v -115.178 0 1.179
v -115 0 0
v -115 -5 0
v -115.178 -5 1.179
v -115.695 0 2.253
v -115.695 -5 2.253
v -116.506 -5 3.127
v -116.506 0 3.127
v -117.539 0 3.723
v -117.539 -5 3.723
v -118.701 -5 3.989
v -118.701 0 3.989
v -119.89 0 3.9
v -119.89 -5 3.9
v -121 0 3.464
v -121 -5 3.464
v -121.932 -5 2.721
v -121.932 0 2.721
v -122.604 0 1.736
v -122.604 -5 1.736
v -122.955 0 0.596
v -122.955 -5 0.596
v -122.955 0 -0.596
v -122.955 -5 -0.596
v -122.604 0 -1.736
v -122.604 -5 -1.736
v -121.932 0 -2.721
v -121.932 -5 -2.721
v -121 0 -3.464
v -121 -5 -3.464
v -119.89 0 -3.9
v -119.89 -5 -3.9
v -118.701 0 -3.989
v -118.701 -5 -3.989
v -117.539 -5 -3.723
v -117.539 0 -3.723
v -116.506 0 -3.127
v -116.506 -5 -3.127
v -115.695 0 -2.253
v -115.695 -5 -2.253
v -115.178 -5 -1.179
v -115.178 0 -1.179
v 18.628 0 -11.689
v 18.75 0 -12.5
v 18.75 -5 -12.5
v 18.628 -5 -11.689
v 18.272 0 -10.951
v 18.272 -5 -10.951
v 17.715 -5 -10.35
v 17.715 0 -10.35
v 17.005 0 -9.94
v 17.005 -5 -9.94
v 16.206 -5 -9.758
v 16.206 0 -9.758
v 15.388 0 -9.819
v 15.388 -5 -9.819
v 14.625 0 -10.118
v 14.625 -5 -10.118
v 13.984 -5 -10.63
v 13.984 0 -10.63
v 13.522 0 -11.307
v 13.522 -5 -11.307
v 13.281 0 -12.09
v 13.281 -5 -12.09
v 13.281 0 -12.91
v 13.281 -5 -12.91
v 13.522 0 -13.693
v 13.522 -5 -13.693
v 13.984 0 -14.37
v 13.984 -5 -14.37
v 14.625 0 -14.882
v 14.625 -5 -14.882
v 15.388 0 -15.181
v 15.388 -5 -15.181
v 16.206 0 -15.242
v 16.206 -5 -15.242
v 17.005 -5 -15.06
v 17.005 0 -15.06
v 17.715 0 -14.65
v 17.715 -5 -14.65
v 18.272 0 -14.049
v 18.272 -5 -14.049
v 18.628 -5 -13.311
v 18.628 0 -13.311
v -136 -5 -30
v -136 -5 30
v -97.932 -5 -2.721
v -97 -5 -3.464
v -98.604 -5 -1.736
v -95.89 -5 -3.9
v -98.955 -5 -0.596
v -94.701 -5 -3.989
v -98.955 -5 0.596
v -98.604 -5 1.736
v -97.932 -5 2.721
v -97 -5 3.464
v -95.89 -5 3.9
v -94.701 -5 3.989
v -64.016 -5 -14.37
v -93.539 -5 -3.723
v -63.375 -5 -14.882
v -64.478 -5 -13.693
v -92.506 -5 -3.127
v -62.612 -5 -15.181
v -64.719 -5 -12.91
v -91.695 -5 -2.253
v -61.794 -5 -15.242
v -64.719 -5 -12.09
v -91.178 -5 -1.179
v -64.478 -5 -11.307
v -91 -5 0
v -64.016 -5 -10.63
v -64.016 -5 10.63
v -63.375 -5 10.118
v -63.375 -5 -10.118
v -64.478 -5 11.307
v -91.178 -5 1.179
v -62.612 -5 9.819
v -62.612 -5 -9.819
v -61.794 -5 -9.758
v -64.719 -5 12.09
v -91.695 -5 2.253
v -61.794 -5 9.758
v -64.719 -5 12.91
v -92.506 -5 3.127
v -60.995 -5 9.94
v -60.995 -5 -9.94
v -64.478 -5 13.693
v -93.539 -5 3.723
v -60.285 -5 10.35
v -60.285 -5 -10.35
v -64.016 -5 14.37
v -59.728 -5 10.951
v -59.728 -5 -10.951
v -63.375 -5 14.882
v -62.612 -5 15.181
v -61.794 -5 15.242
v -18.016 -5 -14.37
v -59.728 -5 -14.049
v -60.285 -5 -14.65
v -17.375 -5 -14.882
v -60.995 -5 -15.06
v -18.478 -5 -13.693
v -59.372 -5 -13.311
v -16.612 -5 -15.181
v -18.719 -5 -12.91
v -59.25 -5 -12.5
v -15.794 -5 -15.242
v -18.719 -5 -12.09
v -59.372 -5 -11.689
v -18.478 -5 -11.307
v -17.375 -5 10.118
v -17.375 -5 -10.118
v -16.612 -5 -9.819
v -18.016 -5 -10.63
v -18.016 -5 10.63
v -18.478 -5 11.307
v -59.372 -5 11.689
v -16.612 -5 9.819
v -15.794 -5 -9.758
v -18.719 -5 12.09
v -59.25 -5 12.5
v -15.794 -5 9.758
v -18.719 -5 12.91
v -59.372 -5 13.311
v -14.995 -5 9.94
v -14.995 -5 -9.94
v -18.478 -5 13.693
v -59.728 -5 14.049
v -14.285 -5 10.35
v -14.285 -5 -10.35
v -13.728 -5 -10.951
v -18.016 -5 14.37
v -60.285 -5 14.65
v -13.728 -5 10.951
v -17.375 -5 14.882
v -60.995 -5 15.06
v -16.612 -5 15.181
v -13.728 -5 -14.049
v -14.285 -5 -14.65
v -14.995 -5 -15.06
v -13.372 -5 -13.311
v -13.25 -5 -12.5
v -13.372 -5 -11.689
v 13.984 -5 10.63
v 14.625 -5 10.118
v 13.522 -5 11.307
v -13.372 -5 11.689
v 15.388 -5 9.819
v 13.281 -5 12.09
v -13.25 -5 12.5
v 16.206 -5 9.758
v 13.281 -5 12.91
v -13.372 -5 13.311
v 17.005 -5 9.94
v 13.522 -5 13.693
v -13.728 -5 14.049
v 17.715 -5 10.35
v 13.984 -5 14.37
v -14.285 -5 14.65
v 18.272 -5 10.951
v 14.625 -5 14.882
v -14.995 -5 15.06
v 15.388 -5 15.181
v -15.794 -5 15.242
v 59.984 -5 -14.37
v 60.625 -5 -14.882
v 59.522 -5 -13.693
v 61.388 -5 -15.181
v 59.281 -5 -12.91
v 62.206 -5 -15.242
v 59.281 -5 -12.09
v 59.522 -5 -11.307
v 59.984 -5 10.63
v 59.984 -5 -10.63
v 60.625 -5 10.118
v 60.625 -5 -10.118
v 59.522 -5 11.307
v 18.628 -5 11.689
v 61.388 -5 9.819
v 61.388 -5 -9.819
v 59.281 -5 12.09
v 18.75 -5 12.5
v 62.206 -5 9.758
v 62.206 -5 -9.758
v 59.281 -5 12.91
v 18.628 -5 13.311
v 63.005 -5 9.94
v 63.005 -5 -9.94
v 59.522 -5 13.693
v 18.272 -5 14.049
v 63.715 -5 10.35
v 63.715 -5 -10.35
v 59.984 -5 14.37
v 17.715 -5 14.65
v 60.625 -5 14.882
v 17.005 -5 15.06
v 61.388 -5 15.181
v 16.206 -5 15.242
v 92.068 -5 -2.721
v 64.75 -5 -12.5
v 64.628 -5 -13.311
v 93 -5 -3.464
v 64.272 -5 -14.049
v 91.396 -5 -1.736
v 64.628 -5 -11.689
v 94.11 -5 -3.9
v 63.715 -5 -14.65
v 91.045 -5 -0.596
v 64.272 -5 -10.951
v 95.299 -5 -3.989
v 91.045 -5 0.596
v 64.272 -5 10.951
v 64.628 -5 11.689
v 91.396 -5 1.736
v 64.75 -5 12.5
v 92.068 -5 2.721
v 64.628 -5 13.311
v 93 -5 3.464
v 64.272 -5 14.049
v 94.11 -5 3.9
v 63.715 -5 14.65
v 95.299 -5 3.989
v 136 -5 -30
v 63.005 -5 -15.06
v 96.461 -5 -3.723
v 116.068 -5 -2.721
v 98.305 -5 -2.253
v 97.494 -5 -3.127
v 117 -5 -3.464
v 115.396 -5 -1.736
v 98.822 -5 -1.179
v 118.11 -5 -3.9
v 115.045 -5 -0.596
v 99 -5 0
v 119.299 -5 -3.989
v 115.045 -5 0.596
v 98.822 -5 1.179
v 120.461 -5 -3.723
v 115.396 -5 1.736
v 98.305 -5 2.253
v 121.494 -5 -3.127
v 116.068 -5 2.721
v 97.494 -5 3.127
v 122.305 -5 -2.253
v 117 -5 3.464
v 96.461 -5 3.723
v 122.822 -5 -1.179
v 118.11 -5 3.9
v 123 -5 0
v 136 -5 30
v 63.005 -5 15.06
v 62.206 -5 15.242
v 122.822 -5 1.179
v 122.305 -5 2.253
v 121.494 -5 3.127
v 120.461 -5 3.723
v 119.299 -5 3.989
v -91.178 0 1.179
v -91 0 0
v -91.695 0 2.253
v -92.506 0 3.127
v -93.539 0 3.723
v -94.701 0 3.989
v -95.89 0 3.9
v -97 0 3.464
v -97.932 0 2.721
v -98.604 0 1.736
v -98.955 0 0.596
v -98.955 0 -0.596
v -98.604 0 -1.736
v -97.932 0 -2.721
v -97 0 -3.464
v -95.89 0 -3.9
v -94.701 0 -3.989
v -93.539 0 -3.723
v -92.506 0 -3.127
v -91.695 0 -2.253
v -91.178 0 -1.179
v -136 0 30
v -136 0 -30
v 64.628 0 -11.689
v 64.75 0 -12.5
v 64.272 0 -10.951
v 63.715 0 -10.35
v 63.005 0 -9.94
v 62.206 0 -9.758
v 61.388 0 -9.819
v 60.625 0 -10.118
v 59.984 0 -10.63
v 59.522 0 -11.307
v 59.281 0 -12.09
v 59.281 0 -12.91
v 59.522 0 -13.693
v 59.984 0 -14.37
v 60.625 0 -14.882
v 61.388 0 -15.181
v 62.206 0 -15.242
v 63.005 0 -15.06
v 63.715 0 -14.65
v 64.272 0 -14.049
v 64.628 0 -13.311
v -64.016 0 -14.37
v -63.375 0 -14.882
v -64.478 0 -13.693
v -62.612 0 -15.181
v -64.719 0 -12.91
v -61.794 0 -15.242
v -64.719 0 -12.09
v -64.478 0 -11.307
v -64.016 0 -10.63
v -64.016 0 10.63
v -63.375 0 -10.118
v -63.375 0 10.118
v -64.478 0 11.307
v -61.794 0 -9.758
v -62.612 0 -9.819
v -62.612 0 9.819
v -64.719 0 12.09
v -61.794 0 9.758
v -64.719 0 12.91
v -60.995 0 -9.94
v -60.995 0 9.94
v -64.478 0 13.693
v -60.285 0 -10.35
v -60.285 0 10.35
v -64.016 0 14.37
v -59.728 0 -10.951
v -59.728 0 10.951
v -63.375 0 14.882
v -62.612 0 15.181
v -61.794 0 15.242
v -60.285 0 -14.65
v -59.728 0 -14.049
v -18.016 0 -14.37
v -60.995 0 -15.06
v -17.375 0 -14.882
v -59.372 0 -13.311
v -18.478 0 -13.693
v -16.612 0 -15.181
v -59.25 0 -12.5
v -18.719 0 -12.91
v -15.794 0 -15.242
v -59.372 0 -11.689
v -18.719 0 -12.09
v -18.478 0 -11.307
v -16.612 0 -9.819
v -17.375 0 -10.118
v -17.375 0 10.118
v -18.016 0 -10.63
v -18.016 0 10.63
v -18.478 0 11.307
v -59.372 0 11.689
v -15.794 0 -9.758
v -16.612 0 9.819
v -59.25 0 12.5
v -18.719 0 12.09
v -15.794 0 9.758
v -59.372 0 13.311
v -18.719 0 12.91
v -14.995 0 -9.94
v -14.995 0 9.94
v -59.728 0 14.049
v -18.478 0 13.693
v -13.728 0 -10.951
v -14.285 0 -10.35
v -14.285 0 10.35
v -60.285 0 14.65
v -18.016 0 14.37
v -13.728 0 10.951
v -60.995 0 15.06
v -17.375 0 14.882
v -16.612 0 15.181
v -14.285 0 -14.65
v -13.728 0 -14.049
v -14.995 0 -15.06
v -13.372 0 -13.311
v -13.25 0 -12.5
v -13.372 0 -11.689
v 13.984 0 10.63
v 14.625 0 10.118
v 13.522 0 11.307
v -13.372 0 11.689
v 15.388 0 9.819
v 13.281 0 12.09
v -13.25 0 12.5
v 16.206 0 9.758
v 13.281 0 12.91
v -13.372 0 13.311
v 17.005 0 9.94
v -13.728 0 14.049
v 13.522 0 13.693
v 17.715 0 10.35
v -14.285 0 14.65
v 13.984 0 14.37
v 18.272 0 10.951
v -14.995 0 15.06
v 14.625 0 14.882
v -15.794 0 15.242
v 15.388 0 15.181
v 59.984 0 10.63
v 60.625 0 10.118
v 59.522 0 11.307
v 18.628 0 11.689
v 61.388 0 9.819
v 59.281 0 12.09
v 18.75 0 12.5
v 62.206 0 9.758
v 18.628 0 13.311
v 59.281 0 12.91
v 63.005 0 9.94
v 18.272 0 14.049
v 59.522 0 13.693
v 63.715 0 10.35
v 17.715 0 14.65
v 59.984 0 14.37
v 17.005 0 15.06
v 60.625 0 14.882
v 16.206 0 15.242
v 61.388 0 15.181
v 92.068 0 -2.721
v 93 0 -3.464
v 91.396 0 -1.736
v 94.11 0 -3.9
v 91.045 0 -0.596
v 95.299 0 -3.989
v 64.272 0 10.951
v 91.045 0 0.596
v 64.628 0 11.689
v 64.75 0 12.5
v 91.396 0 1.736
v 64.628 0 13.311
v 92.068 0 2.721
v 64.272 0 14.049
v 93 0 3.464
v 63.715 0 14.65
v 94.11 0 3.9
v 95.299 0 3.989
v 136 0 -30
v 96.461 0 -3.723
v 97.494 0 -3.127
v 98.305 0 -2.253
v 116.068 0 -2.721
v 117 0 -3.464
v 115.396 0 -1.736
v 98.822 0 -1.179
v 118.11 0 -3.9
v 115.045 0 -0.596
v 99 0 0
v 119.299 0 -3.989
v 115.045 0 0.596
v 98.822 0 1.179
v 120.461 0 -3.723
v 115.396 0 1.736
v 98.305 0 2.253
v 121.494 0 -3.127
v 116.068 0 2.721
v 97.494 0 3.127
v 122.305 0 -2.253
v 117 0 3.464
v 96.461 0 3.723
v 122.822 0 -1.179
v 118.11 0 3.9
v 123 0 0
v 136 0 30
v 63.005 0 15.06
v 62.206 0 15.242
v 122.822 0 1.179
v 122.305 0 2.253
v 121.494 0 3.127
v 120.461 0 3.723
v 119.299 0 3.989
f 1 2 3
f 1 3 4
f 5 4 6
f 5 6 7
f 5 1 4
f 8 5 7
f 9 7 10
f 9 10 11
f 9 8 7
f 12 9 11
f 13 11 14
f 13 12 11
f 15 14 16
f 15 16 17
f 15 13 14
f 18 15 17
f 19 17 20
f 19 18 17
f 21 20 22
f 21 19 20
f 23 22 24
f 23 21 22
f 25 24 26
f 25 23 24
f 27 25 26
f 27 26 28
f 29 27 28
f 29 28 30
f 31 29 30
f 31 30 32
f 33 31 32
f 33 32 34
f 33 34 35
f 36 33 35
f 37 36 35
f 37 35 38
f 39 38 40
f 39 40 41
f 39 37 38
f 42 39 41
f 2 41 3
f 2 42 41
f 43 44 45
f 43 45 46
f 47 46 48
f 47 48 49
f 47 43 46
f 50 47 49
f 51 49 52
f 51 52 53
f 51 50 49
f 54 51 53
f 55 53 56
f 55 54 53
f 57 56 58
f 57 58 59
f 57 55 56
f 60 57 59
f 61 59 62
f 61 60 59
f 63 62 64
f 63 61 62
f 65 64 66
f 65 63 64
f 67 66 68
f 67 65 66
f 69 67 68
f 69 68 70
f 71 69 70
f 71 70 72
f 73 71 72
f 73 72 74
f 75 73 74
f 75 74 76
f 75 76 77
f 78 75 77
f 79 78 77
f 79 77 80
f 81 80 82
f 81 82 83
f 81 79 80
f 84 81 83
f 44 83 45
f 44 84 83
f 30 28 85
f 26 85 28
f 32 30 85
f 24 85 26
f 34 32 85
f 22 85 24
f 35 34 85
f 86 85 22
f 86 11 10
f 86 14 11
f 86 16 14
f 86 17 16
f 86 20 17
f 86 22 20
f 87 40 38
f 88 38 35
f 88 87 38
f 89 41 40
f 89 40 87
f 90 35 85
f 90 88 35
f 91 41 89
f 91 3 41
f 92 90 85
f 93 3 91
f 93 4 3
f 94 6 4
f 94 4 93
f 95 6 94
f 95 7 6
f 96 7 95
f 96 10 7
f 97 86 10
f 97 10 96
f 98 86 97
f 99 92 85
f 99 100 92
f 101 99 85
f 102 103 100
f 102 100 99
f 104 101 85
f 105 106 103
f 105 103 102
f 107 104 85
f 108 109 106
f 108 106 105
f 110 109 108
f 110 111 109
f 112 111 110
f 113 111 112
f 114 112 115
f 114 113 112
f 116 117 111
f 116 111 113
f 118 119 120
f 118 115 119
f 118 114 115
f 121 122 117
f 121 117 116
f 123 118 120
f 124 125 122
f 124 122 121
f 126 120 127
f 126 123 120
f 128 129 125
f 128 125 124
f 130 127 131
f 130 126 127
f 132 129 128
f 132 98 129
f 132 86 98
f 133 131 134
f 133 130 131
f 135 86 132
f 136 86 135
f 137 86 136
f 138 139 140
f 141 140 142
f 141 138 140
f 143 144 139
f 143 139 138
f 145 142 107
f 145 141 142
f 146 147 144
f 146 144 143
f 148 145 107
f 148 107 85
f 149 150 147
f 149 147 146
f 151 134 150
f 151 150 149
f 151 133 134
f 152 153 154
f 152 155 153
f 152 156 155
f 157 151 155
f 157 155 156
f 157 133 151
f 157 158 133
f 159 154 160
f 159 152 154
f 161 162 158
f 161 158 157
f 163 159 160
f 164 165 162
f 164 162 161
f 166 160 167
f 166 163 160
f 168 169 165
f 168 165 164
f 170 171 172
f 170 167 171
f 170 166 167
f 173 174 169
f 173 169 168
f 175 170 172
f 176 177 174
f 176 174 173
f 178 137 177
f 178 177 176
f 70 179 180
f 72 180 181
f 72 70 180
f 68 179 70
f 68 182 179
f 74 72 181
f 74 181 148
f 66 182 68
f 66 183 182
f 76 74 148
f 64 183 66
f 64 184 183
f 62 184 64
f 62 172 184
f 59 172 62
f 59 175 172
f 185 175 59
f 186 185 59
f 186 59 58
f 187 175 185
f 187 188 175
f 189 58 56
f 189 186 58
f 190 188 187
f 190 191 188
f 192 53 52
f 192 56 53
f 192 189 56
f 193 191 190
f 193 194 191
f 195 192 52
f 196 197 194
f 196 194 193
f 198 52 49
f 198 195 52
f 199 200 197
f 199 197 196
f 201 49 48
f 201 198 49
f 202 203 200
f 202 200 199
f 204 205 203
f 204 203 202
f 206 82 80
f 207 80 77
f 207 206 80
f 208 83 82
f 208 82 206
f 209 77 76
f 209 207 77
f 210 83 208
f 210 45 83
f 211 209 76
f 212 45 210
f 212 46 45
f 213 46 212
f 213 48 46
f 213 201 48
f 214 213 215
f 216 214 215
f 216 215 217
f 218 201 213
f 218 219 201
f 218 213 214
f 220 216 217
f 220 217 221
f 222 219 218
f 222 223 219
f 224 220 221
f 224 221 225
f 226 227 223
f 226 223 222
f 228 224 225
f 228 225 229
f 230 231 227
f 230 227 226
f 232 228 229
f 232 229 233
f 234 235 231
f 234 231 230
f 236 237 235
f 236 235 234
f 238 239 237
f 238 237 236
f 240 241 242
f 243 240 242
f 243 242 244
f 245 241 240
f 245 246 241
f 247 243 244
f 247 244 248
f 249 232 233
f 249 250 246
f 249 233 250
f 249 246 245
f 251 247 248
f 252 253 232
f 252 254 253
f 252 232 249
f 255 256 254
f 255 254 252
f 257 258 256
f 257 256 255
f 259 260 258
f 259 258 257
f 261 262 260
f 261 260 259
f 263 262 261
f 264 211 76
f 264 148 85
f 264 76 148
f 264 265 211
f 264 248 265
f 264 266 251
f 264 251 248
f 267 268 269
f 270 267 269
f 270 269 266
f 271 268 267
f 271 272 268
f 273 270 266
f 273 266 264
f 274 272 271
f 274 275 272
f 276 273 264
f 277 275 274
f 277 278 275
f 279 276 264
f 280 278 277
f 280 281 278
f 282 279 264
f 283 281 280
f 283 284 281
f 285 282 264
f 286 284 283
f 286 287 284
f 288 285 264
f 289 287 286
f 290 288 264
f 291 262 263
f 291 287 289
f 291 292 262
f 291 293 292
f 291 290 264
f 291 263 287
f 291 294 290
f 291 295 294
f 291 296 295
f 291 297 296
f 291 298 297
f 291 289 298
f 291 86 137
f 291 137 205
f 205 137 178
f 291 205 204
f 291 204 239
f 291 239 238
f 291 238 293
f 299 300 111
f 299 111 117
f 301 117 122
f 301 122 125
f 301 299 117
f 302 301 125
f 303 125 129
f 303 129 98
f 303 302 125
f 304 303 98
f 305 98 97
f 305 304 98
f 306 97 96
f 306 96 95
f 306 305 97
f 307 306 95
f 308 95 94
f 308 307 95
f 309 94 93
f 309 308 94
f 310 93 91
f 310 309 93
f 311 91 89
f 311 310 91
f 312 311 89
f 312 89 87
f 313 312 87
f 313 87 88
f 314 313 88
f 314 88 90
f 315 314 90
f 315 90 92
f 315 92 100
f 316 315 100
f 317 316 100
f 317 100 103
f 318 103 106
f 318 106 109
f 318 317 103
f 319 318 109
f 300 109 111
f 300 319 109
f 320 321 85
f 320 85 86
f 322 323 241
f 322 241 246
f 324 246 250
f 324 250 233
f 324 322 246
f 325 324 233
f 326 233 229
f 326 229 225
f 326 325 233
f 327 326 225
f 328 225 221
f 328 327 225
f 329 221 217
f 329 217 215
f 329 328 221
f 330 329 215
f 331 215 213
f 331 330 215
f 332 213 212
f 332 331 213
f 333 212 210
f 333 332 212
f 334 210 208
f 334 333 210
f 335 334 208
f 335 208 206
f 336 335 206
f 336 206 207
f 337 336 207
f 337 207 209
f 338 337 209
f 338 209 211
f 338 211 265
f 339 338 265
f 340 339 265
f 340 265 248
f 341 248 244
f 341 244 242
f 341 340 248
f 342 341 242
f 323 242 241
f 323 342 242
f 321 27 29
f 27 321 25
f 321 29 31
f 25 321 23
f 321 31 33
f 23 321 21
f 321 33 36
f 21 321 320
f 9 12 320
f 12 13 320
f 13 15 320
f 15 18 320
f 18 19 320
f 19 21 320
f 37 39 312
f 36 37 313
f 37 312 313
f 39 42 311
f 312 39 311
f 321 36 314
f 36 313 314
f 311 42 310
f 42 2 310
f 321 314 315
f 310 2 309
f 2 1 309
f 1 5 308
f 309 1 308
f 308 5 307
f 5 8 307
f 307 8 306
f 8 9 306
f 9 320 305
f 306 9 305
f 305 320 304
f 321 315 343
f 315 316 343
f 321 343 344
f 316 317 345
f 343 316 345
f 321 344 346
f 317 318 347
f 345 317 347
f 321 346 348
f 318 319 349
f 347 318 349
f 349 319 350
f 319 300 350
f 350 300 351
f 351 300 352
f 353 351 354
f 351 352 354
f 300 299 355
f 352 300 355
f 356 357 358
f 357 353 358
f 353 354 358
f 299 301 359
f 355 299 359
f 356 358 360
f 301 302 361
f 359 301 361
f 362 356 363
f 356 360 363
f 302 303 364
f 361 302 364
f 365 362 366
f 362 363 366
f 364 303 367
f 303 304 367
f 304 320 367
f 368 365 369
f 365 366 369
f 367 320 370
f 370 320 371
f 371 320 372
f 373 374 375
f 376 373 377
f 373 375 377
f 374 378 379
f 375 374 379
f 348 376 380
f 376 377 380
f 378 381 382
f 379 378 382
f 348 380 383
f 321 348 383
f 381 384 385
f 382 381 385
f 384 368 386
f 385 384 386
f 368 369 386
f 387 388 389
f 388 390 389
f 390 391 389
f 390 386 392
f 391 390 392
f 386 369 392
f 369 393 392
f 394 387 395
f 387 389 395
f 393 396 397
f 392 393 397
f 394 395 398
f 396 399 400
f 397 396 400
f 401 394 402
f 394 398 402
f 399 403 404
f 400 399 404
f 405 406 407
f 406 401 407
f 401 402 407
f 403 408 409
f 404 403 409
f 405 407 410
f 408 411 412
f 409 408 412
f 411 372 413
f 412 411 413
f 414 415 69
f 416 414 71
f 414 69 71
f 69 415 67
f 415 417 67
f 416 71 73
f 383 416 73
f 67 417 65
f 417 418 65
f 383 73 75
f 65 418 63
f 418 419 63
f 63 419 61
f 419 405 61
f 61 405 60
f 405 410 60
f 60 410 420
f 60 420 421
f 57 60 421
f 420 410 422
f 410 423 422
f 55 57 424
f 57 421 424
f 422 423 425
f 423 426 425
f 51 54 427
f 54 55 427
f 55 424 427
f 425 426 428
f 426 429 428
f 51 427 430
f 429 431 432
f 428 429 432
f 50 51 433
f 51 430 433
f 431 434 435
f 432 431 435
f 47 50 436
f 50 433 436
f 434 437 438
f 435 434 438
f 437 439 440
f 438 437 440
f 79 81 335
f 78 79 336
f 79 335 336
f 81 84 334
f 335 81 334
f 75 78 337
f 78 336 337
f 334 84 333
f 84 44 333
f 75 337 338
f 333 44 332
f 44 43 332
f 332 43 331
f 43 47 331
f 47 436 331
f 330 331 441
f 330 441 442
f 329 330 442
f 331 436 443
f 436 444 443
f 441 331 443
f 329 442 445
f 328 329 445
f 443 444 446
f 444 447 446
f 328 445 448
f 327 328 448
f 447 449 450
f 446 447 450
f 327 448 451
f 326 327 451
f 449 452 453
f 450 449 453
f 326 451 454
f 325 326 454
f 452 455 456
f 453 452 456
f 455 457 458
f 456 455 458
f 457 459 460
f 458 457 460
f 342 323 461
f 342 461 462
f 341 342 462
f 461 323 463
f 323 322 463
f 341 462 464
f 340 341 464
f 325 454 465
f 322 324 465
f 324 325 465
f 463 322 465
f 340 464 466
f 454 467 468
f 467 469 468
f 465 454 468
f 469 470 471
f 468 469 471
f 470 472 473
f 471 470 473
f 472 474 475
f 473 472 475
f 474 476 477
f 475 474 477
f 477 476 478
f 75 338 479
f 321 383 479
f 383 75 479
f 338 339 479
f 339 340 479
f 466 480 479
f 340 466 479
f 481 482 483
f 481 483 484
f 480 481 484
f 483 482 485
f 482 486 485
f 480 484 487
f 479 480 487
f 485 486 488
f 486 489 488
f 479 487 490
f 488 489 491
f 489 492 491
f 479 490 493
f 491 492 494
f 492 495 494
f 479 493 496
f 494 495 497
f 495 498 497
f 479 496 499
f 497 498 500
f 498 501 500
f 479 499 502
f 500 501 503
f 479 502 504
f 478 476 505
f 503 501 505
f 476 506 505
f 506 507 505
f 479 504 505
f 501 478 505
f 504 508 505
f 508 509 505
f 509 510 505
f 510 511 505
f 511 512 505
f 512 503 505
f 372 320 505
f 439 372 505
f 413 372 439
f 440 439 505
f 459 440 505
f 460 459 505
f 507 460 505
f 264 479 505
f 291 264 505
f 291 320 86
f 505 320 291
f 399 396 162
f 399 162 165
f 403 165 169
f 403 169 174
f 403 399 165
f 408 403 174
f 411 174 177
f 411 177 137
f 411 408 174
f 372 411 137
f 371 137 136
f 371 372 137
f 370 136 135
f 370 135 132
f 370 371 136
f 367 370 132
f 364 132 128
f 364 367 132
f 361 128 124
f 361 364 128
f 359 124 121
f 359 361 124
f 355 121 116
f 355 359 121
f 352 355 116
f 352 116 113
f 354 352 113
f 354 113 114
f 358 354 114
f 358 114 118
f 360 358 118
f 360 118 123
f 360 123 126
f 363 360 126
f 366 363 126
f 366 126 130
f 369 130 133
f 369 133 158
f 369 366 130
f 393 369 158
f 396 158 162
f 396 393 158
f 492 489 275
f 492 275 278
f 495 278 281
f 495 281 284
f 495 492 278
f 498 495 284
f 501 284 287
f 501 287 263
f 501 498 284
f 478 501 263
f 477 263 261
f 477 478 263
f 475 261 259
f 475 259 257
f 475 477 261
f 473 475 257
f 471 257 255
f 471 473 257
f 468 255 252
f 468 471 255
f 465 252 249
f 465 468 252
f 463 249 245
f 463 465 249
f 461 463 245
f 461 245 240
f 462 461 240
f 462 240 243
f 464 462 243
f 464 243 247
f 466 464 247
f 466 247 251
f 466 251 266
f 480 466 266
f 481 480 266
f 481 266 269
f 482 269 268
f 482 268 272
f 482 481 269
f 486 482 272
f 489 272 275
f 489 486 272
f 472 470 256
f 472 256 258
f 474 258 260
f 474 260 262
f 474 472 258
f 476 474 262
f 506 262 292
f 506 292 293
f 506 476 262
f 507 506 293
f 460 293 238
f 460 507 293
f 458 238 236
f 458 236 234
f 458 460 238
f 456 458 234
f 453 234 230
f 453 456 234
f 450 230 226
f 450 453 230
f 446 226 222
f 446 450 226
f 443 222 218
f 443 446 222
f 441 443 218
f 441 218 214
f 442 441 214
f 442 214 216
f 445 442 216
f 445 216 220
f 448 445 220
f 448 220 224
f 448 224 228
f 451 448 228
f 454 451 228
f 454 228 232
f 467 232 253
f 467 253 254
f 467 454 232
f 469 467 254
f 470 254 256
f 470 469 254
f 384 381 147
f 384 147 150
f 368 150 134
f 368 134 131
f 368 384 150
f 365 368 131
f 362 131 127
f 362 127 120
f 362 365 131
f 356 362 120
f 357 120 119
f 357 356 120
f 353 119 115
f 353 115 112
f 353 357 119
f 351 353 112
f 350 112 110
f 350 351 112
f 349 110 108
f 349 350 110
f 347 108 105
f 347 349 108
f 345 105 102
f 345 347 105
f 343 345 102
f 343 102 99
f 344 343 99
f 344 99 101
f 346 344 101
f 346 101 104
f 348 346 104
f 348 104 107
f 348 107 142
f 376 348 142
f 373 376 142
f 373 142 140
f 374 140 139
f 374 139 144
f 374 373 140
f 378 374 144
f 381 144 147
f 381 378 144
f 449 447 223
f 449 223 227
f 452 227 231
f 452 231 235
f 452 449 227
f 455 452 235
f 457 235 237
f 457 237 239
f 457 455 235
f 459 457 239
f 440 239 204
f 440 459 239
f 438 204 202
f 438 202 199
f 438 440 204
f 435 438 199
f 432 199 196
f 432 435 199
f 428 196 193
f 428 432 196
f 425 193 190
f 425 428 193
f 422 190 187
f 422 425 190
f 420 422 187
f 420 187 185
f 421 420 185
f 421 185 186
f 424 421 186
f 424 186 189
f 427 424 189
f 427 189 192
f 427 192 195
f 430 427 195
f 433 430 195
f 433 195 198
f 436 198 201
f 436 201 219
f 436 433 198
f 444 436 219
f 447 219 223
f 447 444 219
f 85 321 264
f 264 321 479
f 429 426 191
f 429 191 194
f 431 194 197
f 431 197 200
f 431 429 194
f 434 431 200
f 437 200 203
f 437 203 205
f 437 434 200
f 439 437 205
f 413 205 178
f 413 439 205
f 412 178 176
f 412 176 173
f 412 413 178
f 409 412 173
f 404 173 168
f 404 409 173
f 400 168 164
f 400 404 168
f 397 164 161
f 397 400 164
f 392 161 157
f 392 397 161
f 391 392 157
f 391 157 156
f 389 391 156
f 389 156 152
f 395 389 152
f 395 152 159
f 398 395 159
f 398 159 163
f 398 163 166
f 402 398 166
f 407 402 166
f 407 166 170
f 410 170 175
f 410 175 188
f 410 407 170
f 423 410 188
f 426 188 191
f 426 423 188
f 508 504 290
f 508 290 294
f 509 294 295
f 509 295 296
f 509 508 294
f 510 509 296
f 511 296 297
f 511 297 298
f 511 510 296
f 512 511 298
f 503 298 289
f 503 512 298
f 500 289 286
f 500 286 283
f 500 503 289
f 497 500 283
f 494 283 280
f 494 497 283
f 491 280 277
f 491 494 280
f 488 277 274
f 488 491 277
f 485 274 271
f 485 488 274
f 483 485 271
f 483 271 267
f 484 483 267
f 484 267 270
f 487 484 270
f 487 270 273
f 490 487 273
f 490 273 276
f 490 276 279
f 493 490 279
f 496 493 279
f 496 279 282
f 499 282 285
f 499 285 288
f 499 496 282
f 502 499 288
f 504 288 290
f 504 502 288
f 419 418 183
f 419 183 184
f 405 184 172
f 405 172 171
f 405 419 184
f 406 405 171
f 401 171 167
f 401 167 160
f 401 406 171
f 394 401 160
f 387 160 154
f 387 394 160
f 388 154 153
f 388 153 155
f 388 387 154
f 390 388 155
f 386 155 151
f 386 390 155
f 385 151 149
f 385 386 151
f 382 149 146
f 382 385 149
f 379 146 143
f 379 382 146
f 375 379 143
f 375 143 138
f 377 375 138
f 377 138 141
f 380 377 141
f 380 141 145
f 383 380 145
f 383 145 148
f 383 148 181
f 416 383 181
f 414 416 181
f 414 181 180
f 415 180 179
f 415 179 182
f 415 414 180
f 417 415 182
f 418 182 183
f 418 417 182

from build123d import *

# Parameters (mm, degrees)
F0_W     = 272
F0_H     = 60
F0_R     = 2.75
F0_R_2   = 4
F1_DEPTH = 5


with BuildPart() as f1:
    # F0 (on Front) → F1 (new body)
    with BuildSketch(Plane.XZ):
        Rectangle(F0_W, F0_H)
        with Locations((-62, -12.5)):
            Circle(F0_R, mode=Mode.SUBTRACT)
        with Locations((-16, -12.5)):
            Circle(F0_R, mode=Mode.SUBTRACT)
        with Locations((16, -12.5)):
            Circle(F0_R, mode=Mode.SUBTRACT)
        with Locations((62, -12.5)):
            Circle(F0_R, mode=Mode.SUBTRACT)
        with Locations((-119, 0)):
            Circle(F0_R_2, mode=Mode.SUBTRACT)
        with Locations((-95, 0)):
            Circle(F0_R_2, mode=Mode.SUBTRACT)
        with Locations((-62, 12.5)):
            Circle(F0_R, mode=Mode.SUBTRACT)
        with Locations((-16, 12.5)):
            Circle(F0_R, mode=Mode.SUBTRACT)
        with Locations((16, 12.5)):
            Circle(F0_R, mode=Mode.SUBTRACT)
        with Locations((62, 12.5)):
            Circle(F0_R, mode=Mode.SUBTRACT)
        with Locations((95, 0)):
            Circle(F0_R_2, mode=Mode.SUBTRACT)
        with Locations((119, 0)):
            Circle(F0_R_2, mode=Mode.SUBTRACT)
    extrude(amount=F1_DEPTH)


solid = f1.part
